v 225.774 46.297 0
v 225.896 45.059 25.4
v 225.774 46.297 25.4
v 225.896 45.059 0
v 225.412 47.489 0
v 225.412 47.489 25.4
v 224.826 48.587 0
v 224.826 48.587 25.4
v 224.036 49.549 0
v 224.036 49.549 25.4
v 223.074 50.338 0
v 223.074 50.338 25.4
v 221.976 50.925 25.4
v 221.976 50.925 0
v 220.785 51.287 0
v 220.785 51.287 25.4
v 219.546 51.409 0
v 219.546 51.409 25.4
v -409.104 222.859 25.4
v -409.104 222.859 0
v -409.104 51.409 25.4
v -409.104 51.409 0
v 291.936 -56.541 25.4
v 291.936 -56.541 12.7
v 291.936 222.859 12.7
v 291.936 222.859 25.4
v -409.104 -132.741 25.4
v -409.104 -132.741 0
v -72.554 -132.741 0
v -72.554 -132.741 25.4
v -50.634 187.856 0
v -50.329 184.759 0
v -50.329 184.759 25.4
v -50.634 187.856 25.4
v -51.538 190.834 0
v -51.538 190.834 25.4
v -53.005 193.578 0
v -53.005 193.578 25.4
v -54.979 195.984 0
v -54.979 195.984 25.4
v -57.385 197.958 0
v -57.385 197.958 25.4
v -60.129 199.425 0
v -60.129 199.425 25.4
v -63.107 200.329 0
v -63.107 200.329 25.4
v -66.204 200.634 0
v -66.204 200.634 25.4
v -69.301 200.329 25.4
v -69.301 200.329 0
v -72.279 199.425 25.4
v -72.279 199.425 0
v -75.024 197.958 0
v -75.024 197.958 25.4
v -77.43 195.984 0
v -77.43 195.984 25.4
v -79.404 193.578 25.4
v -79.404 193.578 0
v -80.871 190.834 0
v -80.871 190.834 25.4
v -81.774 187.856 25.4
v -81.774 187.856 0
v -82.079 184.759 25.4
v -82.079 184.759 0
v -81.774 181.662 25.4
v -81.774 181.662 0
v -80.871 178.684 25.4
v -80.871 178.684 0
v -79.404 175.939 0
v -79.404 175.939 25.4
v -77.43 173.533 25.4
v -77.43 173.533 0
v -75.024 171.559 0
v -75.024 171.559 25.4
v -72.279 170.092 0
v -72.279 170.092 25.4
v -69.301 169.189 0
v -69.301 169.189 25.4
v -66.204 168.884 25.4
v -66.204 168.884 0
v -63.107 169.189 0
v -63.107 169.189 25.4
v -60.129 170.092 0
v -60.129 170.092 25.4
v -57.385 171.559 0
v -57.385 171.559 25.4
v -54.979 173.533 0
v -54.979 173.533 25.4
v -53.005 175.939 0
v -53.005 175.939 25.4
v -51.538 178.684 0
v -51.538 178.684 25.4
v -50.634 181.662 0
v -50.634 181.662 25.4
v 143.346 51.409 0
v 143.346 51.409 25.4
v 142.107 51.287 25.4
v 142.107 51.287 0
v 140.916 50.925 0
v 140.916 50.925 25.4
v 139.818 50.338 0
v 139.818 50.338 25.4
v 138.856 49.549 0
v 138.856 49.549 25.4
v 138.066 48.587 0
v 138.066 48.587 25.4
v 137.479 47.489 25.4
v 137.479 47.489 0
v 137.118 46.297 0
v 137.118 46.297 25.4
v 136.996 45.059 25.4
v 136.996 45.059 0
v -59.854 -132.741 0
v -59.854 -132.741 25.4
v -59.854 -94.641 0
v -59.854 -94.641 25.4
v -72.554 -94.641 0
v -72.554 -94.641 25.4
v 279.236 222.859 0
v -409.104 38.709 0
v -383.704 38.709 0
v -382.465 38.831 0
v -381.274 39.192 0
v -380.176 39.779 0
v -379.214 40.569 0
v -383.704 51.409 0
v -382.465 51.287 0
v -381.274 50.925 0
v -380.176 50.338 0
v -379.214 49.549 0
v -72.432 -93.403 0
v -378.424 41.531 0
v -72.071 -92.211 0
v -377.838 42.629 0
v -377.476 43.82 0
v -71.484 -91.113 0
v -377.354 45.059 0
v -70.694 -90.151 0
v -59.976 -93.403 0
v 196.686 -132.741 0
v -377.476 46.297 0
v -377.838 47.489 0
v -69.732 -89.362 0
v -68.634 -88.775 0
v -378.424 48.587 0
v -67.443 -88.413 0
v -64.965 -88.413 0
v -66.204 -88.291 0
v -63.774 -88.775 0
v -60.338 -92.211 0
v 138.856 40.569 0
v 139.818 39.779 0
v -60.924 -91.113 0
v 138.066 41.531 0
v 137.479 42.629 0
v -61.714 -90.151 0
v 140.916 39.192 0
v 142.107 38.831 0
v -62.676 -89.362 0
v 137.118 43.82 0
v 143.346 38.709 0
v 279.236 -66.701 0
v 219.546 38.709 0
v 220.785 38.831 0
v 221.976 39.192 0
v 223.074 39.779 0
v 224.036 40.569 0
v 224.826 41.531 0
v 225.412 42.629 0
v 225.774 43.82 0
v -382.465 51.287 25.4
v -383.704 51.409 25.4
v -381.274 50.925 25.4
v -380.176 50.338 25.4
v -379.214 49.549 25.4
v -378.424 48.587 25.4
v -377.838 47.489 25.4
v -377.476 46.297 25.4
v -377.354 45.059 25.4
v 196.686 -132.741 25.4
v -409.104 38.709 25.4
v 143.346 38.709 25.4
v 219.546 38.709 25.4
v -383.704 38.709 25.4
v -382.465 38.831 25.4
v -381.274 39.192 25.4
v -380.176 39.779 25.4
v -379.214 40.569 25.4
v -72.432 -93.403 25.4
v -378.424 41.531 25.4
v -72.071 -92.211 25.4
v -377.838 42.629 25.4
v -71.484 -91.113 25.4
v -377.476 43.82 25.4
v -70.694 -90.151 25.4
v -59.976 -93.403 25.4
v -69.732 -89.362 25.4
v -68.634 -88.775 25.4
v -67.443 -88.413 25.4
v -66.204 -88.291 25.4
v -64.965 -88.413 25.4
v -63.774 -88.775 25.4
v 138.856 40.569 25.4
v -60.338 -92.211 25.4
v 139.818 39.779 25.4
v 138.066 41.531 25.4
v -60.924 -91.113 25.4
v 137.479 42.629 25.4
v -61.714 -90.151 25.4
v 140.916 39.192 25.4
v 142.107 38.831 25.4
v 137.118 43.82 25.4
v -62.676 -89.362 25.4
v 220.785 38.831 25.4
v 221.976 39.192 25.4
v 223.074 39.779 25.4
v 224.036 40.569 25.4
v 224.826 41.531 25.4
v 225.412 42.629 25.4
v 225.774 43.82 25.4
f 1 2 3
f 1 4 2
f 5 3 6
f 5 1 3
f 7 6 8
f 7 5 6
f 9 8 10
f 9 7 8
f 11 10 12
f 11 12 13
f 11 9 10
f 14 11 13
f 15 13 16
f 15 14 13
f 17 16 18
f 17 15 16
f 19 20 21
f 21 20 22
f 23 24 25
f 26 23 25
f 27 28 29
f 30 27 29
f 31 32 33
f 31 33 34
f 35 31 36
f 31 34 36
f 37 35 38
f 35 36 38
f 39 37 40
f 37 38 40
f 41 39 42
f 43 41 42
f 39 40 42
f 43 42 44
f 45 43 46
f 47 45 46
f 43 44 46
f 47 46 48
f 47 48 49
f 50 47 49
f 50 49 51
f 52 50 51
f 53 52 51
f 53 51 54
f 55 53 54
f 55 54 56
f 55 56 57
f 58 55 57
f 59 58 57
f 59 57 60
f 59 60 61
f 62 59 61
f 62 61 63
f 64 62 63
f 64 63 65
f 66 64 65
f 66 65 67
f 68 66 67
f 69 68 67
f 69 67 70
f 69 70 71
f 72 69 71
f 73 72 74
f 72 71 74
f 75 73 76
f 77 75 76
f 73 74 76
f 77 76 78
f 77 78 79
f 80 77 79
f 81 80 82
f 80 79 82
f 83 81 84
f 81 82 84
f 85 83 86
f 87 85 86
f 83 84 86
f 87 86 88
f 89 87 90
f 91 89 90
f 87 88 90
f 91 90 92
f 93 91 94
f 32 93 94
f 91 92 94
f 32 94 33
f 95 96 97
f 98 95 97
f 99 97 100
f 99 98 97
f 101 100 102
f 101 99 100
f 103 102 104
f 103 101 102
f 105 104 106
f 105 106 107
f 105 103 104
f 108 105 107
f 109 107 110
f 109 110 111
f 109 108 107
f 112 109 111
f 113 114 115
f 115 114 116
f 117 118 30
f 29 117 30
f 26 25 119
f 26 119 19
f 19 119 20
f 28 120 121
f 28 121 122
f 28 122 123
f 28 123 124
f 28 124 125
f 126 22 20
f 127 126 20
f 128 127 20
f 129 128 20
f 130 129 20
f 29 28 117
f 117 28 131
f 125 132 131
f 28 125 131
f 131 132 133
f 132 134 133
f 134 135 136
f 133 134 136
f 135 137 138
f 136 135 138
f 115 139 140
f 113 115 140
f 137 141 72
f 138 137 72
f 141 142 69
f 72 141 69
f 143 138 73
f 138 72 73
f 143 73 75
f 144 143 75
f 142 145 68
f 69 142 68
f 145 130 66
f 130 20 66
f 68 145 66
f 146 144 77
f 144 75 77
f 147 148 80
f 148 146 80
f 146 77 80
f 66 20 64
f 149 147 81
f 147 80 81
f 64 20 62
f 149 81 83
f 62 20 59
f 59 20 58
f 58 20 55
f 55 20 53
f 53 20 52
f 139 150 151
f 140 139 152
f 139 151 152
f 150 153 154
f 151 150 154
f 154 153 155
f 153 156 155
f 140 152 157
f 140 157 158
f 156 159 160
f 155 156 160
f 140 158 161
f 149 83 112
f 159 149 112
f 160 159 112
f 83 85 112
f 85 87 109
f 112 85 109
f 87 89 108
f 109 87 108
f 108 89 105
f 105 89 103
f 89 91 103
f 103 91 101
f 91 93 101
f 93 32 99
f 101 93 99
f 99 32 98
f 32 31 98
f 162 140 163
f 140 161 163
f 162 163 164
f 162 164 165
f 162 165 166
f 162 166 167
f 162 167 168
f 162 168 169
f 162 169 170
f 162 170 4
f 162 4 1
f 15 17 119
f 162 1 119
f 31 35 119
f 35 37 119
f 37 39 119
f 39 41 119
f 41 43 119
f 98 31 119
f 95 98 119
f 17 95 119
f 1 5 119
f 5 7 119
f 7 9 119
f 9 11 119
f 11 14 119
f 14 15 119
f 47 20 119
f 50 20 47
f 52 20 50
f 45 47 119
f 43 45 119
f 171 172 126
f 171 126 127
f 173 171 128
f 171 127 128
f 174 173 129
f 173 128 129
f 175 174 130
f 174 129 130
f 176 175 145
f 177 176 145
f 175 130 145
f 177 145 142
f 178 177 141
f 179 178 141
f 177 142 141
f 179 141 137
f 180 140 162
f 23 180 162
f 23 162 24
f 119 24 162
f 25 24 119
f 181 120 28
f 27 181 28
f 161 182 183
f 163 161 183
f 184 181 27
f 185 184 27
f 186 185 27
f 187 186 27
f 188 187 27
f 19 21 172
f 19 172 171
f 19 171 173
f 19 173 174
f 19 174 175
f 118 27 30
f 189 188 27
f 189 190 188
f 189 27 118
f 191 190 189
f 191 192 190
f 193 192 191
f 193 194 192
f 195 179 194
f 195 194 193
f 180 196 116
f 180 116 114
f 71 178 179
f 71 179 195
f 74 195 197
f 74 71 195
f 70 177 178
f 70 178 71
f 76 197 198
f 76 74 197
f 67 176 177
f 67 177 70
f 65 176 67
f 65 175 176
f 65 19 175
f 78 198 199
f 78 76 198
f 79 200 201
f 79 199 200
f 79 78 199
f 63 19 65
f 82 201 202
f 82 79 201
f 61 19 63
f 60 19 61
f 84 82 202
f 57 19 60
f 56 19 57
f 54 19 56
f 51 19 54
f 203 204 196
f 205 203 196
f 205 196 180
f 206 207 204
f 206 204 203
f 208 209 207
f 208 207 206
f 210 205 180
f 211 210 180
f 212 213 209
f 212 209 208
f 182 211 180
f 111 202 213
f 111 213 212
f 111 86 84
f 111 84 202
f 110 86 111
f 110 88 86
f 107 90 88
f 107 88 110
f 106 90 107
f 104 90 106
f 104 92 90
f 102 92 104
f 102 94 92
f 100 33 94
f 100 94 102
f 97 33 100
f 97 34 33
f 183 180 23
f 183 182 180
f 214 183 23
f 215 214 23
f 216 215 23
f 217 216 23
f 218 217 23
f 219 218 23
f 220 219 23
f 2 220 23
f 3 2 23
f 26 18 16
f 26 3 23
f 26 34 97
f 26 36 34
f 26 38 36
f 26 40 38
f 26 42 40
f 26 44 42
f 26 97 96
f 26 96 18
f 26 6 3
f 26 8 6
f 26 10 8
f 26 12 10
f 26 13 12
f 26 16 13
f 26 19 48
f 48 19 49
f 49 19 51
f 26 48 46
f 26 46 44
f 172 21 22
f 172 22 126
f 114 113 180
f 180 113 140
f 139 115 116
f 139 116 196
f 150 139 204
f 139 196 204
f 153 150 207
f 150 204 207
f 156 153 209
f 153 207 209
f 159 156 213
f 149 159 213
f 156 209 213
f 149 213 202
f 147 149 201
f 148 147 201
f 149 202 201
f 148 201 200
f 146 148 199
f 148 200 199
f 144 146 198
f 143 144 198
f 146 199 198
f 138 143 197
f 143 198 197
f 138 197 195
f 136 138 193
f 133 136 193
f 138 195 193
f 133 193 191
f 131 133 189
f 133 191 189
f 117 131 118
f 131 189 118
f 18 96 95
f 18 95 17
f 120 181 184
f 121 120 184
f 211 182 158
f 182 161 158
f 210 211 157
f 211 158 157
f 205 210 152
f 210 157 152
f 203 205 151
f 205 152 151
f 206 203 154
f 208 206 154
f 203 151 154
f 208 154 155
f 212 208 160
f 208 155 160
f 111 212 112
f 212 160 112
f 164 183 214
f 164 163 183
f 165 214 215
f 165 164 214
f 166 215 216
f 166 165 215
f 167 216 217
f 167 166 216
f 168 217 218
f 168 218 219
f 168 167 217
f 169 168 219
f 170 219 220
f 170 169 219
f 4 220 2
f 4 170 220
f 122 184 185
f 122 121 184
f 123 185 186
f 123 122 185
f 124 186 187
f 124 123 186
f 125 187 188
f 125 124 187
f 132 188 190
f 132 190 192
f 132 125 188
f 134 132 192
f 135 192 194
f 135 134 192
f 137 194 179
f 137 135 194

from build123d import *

# Parameters (mm, degrees)
F1_DEPTH = 25.4
F2_W     = 31.75
F2_H     = 12.7
F2_W_2   = 88.9
F2_R     = 15.875
F3_DEPTH = 25.401
F4_R     = 6.34999
F5_SIZE  = 12.7


# Not quite as in the source:
# - a fillet or chamfer is up to 0.001 mm smaller than in the source, because OpenCascade refuses the exact size


with BuildPart() as f1:
    # F0 (on Top) → F1 (new body)
    with BuildSketch(Plane.XY):
        Polygon((-50.9642694569, 222.8586515407), (-409.1042694569, 222.8586515407), (-409.1042694569, 57.7525011744), (-409.1042694569, 32.4011304667), (-409.1042694569, -132.7413484593), (196.6857305431, -132.7413484593), (291.9357305431, -56.5413484593), (291.9357305431, 222.8586515407), (-49.417052418, 222.8586515407), align=None)
    extrude(amount=F1_DEPTH)

    # F2 (on face) → F3 (cut, through all)
    with BuildSketch(Plane.XY.offset(25.4)):
        with Locations((-393.2292694569, 45.0586515407)):
            Rectangle(F2_W, F2_H)
        with Locations((181.4457305431, 45.0586515407)):
            Rectangle(F2_W_2, F2_H)
        with BuildLine():
            Line((-59.8542694569, -142.5310963776), (-59.8542694569, -94.6413484593))
            ThreePointArc((-59.8542694569, -94.6413484593), (-66.2042694569, -88.2913484593), (-72.5542694569, -94.6413484593))
            Line((-72.5542694569, -94.6413484593), (-72.5542694569, -137.446552515))
            Line((-72.5542694569, -137.446552515), (-59.8542694569, -142.5310963776))
        make_face()
        with Locations((-66.2042694569, 184.7586515407)):
            Circle(F2_R)
    extrude(amount=-F3_DEPTH, mode=Mode.SUBTRACT)

    # F4 (radius 6.35 in the source; OpenCascade refuses exactly that, so slightly less here)
    f4_edges = [f1.edges().sort_by_distance(p)[0] for p in [
        (-377.354269, 51.408652, 12.7),
        (225.895731, 51.408652, 12.7),
        (225.895731, 38.708652, 12.7),
        (-377.354269, 38.708652, 12.7),
        (136.995731, 51.408652, 12.7),
        (136.995731, 38.708652, 12.7),
    ]]
    fillet(f4_edges, radius=F4_R)

    # F5
    f5_edges = [f1.edges().sort_by_distance(p)[0] for p in [
        (291.935731, 83.158652, 0),
    ]]
    chamfer(f5_edges, length=F5_SIZE)


solid = f1.part
